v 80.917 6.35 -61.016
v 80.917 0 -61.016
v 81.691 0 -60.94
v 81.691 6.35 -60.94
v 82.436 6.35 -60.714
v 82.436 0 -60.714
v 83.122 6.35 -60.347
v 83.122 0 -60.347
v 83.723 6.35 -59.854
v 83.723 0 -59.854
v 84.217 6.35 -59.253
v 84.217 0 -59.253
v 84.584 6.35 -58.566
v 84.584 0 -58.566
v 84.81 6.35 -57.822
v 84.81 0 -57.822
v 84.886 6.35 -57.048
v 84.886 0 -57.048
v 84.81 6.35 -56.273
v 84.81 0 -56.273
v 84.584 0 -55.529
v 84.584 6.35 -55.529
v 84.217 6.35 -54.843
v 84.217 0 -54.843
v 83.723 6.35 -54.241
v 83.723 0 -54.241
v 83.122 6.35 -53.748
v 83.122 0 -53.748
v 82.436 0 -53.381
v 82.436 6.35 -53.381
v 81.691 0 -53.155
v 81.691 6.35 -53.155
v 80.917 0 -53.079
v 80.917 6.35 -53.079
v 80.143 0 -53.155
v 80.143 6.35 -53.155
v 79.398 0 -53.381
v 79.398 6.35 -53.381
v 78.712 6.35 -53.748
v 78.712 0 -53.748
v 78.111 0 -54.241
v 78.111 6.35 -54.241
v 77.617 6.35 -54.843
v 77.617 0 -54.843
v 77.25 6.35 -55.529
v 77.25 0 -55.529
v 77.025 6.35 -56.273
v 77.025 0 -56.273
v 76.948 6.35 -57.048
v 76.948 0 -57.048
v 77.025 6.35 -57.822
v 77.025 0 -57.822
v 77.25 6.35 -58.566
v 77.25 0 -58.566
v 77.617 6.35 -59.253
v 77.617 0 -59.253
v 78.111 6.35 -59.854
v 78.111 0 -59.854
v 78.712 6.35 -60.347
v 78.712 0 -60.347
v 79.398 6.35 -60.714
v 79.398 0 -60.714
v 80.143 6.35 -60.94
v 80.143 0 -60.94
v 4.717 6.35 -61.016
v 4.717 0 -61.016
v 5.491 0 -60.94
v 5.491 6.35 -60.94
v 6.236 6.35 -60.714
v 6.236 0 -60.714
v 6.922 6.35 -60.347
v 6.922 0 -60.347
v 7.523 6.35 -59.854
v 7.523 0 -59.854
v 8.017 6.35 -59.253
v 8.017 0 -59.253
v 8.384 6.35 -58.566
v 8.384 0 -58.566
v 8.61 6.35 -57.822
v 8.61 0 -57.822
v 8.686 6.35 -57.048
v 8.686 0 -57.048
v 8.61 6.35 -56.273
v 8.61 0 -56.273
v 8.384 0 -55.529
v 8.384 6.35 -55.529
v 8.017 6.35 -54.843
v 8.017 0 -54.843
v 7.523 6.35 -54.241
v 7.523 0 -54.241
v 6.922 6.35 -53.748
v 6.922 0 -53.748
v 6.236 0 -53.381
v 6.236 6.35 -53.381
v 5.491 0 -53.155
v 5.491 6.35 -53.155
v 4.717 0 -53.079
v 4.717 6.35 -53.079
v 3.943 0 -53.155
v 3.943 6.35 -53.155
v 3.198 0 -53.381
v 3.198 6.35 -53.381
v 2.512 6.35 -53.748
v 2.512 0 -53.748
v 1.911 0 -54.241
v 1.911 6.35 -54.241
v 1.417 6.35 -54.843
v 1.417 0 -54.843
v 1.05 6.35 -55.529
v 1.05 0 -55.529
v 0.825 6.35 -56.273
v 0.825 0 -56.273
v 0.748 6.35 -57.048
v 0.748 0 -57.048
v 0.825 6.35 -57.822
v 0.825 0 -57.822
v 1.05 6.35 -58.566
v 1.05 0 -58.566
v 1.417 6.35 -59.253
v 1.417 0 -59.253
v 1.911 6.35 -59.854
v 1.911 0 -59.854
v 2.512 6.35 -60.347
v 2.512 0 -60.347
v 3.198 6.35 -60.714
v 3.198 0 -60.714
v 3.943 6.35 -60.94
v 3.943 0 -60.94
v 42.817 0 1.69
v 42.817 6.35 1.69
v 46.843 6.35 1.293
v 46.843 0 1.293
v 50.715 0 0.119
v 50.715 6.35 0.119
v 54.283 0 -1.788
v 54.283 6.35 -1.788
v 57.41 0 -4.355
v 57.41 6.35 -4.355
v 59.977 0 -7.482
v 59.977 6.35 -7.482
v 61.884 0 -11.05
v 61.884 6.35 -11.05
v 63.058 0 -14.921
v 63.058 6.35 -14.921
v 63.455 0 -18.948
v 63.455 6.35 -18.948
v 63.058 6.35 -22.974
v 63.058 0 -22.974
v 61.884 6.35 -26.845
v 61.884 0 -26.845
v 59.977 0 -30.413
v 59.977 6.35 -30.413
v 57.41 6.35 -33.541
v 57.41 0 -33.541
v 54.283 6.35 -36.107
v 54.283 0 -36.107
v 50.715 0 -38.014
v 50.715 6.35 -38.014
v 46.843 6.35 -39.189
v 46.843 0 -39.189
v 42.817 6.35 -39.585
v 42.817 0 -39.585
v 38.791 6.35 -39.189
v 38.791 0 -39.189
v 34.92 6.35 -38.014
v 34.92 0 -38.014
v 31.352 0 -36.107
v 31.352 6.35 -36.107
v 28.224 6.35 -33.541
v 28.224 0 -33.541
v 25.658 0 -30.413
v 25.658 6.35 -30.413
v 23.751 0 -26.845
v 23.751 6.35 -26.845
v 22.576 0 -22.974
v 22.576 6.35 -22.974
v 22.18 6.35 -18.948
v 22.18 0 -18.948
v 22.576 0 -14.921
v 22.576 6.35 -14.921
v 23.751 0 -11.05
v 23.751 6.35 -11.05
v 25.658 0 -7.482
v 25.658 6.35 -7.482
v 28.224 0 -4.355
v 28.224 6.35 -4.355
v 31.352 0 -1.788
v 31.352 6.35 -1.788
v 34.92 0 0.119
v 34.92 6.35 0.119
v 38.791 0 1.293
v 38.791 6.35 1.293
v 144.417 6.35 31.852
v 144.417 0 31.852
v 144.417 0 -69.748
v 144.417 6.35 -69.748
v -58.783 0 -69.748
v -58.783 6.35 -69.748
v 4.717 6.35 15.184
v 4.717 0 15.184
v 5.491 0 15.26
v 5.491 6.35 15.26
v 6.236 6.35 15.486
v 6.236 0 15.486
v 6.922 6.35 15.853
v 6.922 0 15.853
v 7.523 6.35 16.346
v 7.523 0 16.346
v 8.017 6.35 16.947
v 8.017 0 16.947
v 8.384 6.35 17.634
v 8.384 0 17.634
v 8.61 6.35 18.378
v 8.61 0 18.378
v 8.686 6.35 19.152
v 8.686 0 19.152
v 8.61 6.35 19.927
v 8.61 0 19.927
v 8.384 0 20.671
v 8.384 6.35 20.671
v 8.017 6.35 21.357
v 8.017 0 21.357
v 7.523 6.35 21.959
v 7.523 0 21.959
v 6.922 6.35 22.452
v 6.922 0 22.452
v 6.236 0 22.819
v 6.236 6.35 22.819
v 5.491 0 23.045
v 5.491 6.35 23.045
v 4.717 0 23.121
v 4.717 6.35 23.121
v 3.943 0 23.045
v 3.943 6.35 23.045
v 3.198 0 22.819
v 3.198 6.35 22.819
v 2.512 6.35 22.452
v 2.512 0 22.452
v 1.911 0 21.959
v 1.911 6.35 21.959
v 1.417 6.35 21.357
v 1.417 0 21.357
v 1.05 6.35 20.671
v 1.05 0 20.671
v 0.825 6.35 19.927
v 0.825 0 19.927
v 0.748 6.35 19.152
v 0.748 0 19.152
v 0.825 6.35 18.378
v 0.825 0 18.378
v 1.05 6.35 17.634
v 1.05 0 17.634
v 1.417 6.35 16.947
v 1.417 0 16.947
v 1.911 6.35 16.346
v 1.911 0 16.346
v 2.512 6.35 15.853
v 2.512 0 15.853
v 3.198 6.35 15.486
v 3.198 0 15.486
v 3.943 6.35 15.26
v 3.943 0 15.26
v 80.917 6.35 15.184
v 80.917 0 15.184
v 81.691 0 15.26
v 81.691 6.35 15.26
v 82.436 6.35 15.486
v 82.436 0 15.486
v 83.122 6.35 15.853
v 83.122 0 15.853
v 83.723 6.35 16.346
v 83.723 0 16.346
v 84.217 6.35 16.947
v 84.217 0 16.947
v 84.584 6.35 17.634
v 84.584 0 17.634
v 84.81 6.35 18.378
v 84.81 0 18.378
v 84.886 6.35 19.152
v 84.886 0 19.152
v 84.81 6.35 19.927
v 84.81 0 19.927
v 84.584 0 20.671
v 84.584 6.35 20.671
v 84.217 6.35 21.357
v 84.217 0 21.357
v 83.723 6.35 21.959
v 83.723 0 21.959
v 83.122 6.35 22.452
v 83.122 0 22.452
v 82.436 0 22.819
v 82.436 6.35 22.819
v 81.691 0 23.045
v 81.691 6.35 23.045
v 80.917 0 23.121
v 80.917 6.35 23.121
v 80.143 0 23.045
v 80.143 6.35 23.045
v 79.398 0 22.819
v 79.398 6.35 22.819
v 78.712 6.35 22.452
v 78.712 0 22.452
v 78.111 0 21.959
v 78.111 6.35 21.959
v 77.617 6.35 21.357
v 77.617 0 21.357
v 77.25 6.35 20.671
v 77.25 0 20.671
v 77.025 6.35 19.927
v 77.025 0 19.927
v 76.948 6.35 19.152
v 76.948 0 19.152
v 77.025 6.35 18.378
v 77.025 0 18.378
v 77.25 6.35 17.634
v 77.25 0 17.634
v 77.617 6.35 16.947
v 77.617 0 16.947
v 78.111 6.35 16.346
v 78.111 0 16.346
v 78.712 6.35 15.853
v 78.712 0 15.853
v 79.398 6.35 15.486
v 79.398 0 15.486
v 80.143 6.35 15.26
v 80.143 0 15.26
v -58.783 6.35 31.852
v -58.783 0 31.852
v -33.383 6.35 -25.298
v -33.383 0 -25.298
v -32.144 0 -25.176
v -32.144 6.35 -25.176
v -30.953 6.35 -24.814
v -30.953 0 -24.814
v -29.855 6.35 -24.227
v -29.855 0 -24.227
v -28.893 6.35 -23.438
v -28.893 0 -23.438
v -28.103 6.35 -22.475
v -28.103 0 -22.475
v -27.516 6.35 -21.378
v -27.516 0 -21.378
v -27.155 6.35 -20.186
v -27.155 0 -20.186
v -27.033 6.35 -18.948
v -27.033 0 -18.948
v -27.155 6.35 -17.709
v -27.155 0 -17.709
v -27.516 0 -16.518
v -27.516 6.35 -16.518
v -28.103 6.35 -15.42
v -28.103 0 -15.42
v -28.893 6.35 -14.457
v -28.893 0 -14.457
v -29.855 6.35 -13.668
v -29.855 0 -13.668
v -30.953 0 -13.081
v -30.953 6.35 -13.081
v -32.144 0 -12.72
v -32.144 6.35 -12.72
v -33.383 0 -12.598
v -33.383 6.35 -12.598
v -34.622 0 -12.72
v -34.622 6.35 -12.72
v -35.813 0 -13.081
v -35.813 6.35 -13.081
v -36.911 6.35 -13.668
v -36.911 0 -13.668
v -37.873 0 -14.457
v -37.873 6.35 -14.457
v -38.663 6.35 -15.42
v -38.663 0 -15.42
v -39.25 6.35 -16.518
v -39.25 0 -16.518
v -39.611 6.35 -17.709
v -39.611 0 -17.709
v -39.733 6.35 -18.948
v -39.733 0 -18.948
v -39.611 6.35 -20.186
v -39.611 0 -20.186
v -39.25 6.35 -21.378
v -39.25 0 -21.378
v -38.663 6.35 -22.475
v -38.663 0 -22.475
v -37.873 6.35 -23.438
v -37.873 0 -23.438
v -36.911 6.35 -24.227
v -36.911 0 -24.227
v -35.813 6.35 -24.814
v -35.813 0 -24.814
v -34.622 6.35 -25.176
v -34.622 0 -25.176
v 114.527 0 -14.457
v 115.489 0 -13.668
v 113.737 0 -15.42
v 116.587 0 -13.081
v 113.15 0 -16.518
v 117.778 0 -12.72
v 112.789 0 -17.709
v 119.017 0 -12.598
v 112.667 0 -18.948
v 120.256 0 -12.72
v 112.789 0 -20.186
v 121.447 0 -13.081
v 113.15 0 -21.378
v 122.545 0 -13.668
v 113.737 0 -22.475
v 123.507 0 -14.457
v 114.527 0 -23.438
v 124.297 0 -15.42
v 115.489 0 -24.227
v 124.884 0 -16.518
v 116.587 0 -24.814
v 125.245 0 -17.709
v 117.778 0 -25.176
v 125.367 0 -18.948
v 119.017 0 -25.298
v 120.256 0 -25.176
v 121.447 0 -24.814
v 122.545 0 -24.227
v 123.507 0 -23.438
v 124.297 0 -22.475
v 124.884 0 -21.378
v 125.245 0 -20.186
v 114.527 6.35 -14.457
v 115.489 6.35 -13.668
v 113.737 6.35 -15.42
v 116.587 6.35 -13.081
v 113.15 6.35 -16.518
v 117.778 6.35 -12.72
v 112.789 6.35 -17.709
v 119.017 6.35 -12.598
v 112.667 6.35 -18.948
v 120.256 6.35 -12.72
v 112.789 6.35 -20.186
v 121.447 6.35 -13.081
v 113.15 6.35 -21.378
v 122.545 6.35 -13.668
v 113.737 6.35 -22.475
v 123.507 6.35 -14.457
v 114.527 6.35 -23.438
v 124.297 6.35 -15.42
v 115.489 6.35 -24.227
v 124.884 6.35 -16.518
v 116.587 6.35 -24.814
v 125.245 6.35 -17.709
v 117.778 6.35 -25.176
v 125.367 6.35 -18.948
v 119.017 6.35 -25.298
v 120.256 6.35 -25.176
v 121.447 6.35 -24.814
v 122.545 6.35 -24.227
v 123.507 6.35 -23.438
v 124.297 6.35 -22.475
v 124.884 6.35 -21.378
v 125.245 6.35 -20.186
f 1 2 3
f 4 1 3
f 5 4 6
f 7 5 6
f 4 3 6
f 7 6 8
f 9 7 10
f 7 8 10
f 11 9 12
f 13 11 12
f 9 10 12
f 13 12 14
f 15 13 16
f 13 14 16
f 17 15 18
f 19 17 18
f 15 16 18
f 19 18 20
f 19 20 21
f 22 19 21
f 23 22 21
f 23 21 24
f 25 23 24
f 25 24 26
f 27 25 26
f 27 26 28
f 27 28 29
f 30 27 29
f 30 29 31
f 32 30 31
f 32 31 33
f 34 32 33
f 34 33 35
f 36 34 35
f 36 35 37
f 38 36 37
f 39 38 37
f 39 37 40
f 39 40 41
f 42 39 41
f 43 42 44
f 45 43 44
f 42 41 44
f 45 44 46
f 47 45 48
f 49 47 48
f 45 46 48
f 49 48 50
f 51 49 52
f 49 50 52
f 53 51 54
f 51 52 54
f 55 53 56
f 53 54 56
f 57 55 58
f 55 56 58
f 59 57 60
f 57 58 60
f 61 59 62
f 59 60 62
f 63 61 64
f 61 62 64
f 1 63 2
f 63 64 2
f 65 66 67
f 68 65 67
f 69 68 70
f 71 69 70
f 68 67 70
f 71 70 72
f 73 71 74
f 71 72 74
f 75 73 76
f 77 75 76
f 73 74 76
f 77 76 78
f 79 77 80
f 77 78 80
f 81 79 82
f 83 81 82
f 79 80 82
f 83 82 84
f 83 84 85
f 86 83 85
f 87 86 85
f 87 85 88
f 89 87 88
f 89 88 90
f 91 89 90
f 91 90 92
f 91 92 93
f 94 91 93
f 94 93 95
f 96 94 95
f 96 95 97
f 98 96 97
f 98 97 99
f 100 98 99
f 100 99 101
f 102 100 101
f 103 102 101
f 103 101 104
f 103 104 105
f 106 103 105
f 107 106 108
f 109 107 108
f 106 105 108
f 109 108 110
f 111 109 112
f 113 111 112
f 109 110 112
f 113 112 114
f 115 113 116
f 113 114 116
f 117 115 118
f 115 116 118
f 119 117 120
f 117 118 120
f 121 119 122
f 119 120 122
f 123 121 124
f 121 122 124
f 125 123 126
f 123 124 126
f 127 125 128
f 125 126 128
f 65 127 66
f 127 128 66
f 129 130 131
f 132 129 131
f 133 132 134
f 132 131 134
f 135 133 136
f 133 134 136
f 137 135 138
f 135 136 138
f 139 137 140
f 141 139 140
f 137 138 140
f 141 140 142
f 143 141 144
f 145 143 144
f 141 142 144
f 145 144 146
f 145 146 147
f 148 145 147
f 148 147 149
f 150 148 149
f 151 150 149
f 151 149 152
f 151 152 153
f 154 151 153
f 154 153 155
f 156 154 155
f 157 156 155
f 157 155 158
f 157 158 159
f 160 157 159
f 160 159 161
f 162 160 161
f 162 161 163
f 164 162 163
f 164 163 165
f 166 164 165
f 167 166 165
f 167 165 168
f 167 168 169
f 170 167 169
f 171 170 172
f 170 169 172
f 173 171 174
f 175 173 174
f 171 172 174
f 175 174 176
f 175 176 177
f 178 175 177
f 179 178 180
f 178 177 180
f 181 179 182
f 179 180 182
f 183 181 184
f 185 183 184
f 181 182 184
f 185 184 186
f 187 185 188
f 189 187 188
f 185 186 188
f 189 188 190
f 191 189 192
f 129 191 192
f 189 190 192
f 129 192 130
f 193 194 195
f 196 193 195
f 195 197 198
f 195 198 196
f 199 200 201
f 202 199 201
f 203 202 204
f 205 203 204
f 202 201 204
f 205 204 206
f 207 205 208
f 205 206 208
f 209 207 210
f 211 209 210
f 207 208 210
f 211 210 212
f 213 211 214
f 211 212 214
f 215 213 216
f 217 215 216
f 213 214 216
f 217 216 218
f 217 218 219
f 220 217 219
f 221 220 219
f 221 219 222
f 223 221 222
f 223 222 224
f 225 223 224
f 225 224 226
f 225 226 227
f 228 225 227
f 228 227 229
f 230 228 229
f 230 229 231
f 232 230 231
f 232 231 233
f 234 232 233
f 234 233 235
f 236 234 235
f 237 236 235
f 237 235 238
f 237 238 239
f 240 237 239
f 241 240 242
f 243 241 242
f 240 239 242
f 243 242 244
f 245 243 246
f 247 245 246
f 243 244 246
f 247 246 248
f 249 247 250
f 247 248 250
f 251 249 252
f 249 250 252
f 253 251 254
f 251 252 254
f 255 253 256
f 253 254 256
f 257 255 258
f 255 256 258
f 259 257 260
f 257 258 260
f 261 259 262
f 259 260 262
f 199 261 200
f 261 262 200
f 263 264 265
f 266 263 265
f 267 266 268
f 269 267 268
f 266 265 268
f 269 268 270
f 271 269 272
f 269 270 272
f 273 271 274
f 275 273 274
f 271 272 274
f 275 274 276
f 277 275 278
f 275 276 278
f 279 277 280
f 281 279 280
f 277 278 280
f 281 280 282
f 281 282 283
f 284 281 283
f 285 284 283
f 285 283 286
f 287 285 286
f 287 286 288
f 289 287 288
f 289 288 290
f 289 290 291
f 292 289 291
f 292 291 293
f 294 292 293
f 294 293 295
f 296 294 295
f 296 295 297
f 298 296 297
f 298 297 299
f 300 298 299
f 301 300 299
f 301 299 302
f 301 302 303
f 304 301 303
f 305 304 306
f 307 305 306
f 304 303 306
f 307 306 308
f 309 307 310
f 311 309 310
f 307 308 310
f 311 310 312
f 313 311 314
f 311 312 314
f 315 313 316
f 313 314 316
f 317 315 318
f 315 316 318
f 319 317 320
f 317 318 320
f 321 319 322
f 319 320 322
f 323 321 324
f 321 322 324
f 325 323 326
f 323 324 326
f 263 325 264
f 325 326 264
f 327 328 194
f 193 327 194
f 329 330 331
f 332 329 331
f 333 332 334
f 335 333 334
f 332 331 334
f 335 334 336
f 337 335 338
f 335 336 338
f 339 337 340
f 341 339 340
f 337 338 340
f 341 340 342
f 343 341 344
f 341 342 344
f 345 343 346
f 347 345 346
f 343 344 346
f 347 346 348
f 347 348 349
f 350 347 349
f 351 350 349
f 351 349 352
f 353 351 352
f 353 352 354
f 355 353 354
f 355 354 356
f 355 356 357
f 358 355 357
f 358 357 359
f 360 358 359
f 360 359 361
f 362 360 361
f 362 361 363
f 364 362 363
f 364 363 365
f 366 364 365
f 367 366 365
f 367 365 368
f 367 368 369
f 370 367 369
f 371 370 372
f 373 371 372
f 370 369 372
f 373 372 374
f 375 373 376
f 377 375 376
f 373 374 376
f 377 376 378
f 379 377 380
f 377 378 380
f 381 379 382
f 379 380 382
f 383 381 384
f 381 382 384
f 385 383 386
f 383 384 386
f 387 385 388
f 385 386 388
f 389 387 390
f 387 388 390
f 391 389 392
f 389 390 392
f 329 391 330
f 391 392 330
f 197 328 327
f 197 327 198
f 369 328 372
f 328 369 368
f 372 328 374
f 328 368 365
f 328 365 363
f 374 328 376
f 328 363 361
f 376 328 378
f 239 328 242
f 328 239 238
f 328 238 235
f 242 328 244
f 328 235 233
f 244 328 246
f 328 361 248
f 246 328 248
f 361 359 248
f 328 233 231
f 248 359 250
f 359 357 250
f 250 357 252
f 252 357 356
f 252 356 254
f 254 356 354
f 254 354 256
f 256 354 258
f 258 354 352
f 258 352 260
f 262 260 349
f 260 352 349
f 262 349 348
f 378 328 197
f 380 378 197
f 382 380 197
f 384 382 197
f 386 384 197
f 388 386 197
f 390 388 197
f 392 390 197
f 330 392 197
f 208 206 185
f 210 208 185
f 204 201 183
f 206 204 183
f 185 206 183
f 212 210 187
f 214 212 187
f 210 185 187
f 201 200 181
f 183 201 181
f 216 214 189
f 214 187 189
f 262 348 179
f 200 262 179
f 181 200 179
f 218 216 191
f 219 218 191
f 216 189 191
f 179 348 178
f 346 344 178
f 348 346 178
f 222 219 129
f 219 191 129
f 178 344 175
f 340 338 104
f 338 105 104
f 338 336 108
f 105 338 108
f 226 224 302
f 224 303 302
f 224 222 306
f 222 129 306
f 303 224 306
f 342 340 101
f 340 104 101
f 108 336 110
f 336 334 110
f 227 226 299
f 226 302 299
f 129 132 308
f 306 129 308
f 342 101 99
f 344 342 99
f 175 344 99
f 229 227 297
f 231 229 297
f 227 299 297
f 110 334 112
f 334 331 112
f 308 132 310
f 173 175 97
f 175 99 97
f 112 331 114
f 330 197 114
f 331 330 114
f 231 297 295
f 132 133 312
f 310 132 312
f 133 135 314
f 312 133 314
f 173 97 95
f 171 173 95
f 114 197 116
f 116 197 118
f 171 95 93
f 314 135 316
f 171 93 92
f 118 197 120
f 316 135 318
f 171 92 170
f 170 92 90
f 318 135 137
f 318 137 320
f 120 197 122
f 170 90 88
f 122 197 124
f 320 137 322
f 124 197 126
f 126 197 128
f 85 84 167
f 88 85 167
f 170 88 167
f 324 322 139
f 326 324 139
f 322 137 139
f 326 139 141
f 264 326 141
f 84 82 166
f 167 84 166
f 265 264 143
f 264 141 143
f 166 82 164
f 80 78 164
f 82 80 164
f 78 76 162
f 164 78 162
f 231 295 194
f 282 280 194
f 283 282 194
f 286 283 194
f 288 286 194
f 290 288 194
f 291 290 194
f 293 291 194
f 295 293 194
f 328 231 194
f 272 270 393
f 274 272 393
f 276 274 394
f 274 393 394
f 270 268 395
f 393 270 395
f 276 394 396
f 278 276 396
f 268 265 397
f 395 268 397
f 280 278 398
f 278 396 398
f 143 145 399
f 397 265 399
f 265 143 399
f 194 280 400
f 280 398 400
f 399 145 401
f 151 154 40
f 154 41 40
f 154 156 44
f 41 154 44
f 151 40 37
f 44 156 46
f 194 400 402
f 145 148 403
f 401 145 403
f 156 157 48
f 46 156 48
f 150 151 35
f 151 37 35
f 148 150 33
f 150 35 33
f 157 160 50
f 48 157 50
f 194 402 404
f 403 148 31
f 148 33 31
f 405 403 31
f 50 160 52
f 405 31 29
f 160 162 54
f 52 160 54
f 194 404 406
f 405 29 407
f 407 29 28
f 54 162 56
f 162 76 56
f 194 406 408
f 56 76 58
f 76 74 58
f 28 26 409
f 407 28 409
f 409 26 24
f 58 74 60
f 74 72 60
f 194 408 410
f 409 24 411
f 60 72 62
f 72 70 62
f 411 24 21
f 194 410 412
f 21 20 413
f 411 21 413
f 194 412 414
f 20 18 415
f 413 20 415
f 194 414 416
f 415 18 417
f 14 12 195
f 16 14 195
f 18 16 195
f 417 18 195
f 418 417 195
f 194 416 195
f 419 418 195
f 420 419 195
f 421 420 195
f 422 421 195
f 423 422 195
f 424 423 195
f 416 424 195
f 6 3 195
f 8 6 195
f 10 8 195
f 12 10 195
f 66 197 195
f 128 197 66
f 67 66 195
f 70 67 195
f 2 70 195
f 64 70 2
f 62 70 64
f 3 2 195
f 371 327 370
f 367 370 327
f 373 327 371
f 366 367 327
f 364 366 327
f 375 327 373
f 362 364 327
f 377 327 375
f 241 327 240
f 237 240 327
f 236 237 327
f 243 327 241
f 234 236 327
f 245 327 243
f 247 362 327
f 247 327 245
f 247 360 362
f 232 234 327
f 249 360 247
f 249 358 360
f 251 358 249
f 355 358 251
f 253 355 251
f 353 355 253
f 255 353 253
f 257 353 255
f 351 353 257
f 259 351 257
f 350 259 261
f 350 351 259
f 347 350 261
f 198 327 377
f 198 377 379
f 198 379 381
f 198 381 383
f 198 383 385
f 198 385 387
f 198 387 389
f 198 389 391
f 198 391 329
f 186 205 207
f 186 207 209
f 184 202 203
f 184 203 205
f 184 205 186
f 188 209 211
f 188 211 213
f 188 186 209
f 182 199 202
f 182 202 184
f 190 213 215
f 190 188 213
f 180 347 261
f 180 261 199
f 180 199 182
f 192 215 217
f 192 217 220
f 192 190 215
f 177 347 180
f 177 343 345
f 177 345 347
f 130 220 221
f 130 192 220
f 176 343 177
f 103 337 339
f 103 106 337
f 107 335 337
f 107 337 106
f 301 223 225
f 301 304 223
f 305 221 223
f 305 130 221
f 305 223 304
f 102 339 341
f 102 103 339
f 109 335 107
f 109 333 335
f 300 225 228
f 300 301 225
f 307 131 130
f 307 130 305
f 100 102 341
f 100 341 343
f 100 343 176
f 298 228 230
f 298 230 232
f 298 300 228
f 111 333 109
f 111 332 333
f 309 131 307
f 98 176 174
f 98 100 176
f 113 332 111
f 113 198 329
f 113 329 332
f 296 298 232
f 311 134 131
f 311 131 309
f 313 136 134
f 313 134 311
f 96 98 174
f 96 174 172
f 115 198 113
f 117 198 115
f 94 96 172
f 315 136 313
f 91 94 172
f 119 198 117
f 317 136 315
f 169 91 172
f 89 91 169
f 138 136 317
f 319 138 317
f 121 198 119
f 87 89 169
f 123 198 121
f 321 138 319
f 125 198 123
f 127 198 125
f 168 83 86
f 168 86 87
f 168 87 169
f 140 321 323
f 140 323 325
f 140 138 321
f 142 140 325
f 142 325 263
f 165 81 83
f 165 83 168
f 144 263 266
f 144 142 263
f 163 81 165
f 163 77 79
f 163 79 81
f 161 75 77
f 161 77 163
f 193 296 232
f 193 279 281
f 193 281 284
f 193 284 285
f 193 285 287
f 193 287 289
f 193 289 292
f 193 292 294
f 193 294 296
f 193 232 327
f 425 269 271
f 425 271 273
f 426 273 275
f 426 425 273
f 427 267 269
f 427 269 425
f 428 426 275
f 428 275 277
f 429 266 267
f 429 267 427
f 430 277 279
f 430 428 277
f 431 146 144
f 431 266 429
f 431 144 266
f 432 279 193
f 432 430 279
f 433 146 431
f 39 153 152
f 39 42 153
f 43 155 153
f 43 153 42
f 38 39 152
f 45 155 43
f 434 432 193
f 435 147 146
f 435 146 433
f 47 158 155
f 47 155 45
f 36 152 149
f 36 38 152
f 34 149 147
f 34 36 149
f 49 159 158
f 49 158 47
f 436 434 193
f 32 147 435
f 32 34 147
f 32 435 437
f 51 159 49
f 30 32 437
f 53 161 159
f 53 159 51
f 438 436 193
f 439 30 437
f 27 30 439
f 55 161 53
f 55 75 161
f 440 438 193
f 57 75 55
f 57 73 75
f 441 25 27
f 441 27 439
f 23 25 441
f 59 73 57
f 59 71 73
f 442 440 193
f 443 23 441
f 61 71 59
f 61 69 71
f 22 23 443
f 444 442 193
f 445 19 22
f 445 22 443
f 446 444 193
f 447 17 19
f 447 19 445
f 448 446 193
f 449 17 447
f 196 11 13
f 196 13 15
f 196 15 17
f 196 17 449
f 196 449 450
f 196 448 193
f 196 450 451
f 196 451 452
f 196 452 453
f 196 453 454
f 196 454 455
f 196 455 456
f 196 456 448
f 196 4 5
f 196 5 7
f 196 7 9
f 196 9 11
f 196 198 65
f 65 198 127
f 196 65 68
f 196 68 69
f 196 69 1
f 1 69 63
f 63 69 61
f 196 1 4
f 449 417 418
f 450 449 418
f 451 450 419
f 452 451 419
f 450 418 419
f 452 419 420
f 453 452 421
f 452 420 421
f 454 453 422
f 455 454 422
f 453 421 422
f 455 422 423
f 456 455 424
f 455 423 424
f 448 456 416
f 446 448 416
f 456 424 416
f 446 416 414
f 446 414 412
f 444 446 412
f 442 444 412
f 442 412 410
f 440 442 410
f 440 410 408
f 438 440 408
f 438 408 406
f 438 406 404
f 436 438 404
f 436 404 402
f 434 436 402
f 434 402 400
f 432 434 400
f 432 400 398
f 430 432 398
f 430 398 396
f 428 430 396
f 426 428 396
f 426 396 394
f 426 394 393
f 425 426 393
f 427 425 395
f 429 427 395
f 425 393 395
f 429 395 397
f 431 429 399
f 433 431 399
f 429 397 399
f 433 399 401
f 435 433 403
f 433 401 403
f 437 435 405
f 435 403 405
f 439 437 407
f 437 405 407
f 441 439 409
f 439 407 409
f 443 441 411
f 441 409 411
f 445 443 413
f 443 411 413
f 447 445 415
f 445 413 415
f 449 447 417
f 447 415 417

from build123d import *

# Parameters (mm, degrees)
SKETCH1_W                      = 203.2
SKETCH1_H                      = 101.6
BOSS_EXTRUDE1_DEPTH            = 6.35
F_1_2_0_5_DIAMETER_HOLE1_D     = 12.7
F_1_2_0_5_DIAMETER_HOLE1_DEPTH = 25.4
F_1_2_0_5_DIAMETER_HOLE1_TIP   = 3.815464931
SKETCH4_R                      = 20.6375
CUT_EXTRUDE1_DEPTH             = 161.50344791
F_3_8_16_TAPPED_HOLE1_D        = 7.9375
F_3_8_16_TAPPED_HOLE1_DEPTH    = 23.8125
F_3_8_16_TAPPED_HOLE1_TIP      = 2.384665582


with BuildPart() as part:
    # Sketch1 → Boss-Extrude1 (new body)
    with BuildSketch(Plane(origin=(0, 0, 0), x_dir=(1, 0, 0), z_dir=(0, 1, 0))):
        with Locations((42.817129402, 18.947595129)):
            Rectangle(SKETCH1_W, SKETCH1_H)
    extrude(amount=BOSS_EXTRUDE1_DEPTH)

    # 1/2 (0.5) Diameter Hole1
    with Locations(Plane(origin=(-33.382870598, 6.35, -18.947595129), x_dir=(0, 0, 1), z_dir=(0, 1, 0))):
        with Locations((0, 0), (0, 152.4)):
            Hole(F_1_2_0_5_DIAMETER_HOLE1_D / 2, depth=F_1_2_0_5_DIAMETER_HOLE1_DEPTH)
            with Locations((0, 0, -(F_1_2_0_5_DIAMETER_HOLE1_DEPTH + F_1_2_0_5_DIAMETER_HOLE1_TIP / 2))):  # 118° drill point
                Cone(0, F_1_2_0_5_DIAMETER_HOLE1_D / 2, F_1_2_0_5_DIAMETER_HOLE1_TIP, mode=Mode.SUBTRACT)

    # Sketch4 → Cut-Extrude1 (cut, through all)
    with BuildSketch(Plane(origin=(0, 6.35, 0), x_dir=(1, 0, 0), z_dir=(0, 1, 0))):
        with Locations(Location((42.817129402, 18.947595129, 0), (0, 0, 270))):
            Circle(SKETCH4_R)
    extrude(amount=-CUT_EXTRUDE1_DEPTH, mode=Mode.SUBTRACT)

    # 3/8-16 Tapped Hole1
    with Locations(Plane(origin=(4.717129402, 6.35, -57.047595129), x_dir=(0, 0, 1), z_dir=(0, 1, 0))):
        with Locations((0, 0), (0, 76.2), (76.2, 76.2), (76.2, 0)):
            Hole(F_3_8_16_TAPPED_HOLE1_D / 2, depth=F_3_8_16_TAPPED_HOLE1_DEPTH)
            with Locations((0, 0, -(F_3_8_16_TAPPED_HOLE1_DEPTH + F_3_8_16_TAPPED_HOLE1_TIP / 2))):  # 118° drill point
                Cone(0, F_3_8_16_TAPPED_HOLE1_D / 2, F_3_8_16_TAPPED_HOLE1_TIP, mode=Mode.SUBTRACT)


solid = part.part
